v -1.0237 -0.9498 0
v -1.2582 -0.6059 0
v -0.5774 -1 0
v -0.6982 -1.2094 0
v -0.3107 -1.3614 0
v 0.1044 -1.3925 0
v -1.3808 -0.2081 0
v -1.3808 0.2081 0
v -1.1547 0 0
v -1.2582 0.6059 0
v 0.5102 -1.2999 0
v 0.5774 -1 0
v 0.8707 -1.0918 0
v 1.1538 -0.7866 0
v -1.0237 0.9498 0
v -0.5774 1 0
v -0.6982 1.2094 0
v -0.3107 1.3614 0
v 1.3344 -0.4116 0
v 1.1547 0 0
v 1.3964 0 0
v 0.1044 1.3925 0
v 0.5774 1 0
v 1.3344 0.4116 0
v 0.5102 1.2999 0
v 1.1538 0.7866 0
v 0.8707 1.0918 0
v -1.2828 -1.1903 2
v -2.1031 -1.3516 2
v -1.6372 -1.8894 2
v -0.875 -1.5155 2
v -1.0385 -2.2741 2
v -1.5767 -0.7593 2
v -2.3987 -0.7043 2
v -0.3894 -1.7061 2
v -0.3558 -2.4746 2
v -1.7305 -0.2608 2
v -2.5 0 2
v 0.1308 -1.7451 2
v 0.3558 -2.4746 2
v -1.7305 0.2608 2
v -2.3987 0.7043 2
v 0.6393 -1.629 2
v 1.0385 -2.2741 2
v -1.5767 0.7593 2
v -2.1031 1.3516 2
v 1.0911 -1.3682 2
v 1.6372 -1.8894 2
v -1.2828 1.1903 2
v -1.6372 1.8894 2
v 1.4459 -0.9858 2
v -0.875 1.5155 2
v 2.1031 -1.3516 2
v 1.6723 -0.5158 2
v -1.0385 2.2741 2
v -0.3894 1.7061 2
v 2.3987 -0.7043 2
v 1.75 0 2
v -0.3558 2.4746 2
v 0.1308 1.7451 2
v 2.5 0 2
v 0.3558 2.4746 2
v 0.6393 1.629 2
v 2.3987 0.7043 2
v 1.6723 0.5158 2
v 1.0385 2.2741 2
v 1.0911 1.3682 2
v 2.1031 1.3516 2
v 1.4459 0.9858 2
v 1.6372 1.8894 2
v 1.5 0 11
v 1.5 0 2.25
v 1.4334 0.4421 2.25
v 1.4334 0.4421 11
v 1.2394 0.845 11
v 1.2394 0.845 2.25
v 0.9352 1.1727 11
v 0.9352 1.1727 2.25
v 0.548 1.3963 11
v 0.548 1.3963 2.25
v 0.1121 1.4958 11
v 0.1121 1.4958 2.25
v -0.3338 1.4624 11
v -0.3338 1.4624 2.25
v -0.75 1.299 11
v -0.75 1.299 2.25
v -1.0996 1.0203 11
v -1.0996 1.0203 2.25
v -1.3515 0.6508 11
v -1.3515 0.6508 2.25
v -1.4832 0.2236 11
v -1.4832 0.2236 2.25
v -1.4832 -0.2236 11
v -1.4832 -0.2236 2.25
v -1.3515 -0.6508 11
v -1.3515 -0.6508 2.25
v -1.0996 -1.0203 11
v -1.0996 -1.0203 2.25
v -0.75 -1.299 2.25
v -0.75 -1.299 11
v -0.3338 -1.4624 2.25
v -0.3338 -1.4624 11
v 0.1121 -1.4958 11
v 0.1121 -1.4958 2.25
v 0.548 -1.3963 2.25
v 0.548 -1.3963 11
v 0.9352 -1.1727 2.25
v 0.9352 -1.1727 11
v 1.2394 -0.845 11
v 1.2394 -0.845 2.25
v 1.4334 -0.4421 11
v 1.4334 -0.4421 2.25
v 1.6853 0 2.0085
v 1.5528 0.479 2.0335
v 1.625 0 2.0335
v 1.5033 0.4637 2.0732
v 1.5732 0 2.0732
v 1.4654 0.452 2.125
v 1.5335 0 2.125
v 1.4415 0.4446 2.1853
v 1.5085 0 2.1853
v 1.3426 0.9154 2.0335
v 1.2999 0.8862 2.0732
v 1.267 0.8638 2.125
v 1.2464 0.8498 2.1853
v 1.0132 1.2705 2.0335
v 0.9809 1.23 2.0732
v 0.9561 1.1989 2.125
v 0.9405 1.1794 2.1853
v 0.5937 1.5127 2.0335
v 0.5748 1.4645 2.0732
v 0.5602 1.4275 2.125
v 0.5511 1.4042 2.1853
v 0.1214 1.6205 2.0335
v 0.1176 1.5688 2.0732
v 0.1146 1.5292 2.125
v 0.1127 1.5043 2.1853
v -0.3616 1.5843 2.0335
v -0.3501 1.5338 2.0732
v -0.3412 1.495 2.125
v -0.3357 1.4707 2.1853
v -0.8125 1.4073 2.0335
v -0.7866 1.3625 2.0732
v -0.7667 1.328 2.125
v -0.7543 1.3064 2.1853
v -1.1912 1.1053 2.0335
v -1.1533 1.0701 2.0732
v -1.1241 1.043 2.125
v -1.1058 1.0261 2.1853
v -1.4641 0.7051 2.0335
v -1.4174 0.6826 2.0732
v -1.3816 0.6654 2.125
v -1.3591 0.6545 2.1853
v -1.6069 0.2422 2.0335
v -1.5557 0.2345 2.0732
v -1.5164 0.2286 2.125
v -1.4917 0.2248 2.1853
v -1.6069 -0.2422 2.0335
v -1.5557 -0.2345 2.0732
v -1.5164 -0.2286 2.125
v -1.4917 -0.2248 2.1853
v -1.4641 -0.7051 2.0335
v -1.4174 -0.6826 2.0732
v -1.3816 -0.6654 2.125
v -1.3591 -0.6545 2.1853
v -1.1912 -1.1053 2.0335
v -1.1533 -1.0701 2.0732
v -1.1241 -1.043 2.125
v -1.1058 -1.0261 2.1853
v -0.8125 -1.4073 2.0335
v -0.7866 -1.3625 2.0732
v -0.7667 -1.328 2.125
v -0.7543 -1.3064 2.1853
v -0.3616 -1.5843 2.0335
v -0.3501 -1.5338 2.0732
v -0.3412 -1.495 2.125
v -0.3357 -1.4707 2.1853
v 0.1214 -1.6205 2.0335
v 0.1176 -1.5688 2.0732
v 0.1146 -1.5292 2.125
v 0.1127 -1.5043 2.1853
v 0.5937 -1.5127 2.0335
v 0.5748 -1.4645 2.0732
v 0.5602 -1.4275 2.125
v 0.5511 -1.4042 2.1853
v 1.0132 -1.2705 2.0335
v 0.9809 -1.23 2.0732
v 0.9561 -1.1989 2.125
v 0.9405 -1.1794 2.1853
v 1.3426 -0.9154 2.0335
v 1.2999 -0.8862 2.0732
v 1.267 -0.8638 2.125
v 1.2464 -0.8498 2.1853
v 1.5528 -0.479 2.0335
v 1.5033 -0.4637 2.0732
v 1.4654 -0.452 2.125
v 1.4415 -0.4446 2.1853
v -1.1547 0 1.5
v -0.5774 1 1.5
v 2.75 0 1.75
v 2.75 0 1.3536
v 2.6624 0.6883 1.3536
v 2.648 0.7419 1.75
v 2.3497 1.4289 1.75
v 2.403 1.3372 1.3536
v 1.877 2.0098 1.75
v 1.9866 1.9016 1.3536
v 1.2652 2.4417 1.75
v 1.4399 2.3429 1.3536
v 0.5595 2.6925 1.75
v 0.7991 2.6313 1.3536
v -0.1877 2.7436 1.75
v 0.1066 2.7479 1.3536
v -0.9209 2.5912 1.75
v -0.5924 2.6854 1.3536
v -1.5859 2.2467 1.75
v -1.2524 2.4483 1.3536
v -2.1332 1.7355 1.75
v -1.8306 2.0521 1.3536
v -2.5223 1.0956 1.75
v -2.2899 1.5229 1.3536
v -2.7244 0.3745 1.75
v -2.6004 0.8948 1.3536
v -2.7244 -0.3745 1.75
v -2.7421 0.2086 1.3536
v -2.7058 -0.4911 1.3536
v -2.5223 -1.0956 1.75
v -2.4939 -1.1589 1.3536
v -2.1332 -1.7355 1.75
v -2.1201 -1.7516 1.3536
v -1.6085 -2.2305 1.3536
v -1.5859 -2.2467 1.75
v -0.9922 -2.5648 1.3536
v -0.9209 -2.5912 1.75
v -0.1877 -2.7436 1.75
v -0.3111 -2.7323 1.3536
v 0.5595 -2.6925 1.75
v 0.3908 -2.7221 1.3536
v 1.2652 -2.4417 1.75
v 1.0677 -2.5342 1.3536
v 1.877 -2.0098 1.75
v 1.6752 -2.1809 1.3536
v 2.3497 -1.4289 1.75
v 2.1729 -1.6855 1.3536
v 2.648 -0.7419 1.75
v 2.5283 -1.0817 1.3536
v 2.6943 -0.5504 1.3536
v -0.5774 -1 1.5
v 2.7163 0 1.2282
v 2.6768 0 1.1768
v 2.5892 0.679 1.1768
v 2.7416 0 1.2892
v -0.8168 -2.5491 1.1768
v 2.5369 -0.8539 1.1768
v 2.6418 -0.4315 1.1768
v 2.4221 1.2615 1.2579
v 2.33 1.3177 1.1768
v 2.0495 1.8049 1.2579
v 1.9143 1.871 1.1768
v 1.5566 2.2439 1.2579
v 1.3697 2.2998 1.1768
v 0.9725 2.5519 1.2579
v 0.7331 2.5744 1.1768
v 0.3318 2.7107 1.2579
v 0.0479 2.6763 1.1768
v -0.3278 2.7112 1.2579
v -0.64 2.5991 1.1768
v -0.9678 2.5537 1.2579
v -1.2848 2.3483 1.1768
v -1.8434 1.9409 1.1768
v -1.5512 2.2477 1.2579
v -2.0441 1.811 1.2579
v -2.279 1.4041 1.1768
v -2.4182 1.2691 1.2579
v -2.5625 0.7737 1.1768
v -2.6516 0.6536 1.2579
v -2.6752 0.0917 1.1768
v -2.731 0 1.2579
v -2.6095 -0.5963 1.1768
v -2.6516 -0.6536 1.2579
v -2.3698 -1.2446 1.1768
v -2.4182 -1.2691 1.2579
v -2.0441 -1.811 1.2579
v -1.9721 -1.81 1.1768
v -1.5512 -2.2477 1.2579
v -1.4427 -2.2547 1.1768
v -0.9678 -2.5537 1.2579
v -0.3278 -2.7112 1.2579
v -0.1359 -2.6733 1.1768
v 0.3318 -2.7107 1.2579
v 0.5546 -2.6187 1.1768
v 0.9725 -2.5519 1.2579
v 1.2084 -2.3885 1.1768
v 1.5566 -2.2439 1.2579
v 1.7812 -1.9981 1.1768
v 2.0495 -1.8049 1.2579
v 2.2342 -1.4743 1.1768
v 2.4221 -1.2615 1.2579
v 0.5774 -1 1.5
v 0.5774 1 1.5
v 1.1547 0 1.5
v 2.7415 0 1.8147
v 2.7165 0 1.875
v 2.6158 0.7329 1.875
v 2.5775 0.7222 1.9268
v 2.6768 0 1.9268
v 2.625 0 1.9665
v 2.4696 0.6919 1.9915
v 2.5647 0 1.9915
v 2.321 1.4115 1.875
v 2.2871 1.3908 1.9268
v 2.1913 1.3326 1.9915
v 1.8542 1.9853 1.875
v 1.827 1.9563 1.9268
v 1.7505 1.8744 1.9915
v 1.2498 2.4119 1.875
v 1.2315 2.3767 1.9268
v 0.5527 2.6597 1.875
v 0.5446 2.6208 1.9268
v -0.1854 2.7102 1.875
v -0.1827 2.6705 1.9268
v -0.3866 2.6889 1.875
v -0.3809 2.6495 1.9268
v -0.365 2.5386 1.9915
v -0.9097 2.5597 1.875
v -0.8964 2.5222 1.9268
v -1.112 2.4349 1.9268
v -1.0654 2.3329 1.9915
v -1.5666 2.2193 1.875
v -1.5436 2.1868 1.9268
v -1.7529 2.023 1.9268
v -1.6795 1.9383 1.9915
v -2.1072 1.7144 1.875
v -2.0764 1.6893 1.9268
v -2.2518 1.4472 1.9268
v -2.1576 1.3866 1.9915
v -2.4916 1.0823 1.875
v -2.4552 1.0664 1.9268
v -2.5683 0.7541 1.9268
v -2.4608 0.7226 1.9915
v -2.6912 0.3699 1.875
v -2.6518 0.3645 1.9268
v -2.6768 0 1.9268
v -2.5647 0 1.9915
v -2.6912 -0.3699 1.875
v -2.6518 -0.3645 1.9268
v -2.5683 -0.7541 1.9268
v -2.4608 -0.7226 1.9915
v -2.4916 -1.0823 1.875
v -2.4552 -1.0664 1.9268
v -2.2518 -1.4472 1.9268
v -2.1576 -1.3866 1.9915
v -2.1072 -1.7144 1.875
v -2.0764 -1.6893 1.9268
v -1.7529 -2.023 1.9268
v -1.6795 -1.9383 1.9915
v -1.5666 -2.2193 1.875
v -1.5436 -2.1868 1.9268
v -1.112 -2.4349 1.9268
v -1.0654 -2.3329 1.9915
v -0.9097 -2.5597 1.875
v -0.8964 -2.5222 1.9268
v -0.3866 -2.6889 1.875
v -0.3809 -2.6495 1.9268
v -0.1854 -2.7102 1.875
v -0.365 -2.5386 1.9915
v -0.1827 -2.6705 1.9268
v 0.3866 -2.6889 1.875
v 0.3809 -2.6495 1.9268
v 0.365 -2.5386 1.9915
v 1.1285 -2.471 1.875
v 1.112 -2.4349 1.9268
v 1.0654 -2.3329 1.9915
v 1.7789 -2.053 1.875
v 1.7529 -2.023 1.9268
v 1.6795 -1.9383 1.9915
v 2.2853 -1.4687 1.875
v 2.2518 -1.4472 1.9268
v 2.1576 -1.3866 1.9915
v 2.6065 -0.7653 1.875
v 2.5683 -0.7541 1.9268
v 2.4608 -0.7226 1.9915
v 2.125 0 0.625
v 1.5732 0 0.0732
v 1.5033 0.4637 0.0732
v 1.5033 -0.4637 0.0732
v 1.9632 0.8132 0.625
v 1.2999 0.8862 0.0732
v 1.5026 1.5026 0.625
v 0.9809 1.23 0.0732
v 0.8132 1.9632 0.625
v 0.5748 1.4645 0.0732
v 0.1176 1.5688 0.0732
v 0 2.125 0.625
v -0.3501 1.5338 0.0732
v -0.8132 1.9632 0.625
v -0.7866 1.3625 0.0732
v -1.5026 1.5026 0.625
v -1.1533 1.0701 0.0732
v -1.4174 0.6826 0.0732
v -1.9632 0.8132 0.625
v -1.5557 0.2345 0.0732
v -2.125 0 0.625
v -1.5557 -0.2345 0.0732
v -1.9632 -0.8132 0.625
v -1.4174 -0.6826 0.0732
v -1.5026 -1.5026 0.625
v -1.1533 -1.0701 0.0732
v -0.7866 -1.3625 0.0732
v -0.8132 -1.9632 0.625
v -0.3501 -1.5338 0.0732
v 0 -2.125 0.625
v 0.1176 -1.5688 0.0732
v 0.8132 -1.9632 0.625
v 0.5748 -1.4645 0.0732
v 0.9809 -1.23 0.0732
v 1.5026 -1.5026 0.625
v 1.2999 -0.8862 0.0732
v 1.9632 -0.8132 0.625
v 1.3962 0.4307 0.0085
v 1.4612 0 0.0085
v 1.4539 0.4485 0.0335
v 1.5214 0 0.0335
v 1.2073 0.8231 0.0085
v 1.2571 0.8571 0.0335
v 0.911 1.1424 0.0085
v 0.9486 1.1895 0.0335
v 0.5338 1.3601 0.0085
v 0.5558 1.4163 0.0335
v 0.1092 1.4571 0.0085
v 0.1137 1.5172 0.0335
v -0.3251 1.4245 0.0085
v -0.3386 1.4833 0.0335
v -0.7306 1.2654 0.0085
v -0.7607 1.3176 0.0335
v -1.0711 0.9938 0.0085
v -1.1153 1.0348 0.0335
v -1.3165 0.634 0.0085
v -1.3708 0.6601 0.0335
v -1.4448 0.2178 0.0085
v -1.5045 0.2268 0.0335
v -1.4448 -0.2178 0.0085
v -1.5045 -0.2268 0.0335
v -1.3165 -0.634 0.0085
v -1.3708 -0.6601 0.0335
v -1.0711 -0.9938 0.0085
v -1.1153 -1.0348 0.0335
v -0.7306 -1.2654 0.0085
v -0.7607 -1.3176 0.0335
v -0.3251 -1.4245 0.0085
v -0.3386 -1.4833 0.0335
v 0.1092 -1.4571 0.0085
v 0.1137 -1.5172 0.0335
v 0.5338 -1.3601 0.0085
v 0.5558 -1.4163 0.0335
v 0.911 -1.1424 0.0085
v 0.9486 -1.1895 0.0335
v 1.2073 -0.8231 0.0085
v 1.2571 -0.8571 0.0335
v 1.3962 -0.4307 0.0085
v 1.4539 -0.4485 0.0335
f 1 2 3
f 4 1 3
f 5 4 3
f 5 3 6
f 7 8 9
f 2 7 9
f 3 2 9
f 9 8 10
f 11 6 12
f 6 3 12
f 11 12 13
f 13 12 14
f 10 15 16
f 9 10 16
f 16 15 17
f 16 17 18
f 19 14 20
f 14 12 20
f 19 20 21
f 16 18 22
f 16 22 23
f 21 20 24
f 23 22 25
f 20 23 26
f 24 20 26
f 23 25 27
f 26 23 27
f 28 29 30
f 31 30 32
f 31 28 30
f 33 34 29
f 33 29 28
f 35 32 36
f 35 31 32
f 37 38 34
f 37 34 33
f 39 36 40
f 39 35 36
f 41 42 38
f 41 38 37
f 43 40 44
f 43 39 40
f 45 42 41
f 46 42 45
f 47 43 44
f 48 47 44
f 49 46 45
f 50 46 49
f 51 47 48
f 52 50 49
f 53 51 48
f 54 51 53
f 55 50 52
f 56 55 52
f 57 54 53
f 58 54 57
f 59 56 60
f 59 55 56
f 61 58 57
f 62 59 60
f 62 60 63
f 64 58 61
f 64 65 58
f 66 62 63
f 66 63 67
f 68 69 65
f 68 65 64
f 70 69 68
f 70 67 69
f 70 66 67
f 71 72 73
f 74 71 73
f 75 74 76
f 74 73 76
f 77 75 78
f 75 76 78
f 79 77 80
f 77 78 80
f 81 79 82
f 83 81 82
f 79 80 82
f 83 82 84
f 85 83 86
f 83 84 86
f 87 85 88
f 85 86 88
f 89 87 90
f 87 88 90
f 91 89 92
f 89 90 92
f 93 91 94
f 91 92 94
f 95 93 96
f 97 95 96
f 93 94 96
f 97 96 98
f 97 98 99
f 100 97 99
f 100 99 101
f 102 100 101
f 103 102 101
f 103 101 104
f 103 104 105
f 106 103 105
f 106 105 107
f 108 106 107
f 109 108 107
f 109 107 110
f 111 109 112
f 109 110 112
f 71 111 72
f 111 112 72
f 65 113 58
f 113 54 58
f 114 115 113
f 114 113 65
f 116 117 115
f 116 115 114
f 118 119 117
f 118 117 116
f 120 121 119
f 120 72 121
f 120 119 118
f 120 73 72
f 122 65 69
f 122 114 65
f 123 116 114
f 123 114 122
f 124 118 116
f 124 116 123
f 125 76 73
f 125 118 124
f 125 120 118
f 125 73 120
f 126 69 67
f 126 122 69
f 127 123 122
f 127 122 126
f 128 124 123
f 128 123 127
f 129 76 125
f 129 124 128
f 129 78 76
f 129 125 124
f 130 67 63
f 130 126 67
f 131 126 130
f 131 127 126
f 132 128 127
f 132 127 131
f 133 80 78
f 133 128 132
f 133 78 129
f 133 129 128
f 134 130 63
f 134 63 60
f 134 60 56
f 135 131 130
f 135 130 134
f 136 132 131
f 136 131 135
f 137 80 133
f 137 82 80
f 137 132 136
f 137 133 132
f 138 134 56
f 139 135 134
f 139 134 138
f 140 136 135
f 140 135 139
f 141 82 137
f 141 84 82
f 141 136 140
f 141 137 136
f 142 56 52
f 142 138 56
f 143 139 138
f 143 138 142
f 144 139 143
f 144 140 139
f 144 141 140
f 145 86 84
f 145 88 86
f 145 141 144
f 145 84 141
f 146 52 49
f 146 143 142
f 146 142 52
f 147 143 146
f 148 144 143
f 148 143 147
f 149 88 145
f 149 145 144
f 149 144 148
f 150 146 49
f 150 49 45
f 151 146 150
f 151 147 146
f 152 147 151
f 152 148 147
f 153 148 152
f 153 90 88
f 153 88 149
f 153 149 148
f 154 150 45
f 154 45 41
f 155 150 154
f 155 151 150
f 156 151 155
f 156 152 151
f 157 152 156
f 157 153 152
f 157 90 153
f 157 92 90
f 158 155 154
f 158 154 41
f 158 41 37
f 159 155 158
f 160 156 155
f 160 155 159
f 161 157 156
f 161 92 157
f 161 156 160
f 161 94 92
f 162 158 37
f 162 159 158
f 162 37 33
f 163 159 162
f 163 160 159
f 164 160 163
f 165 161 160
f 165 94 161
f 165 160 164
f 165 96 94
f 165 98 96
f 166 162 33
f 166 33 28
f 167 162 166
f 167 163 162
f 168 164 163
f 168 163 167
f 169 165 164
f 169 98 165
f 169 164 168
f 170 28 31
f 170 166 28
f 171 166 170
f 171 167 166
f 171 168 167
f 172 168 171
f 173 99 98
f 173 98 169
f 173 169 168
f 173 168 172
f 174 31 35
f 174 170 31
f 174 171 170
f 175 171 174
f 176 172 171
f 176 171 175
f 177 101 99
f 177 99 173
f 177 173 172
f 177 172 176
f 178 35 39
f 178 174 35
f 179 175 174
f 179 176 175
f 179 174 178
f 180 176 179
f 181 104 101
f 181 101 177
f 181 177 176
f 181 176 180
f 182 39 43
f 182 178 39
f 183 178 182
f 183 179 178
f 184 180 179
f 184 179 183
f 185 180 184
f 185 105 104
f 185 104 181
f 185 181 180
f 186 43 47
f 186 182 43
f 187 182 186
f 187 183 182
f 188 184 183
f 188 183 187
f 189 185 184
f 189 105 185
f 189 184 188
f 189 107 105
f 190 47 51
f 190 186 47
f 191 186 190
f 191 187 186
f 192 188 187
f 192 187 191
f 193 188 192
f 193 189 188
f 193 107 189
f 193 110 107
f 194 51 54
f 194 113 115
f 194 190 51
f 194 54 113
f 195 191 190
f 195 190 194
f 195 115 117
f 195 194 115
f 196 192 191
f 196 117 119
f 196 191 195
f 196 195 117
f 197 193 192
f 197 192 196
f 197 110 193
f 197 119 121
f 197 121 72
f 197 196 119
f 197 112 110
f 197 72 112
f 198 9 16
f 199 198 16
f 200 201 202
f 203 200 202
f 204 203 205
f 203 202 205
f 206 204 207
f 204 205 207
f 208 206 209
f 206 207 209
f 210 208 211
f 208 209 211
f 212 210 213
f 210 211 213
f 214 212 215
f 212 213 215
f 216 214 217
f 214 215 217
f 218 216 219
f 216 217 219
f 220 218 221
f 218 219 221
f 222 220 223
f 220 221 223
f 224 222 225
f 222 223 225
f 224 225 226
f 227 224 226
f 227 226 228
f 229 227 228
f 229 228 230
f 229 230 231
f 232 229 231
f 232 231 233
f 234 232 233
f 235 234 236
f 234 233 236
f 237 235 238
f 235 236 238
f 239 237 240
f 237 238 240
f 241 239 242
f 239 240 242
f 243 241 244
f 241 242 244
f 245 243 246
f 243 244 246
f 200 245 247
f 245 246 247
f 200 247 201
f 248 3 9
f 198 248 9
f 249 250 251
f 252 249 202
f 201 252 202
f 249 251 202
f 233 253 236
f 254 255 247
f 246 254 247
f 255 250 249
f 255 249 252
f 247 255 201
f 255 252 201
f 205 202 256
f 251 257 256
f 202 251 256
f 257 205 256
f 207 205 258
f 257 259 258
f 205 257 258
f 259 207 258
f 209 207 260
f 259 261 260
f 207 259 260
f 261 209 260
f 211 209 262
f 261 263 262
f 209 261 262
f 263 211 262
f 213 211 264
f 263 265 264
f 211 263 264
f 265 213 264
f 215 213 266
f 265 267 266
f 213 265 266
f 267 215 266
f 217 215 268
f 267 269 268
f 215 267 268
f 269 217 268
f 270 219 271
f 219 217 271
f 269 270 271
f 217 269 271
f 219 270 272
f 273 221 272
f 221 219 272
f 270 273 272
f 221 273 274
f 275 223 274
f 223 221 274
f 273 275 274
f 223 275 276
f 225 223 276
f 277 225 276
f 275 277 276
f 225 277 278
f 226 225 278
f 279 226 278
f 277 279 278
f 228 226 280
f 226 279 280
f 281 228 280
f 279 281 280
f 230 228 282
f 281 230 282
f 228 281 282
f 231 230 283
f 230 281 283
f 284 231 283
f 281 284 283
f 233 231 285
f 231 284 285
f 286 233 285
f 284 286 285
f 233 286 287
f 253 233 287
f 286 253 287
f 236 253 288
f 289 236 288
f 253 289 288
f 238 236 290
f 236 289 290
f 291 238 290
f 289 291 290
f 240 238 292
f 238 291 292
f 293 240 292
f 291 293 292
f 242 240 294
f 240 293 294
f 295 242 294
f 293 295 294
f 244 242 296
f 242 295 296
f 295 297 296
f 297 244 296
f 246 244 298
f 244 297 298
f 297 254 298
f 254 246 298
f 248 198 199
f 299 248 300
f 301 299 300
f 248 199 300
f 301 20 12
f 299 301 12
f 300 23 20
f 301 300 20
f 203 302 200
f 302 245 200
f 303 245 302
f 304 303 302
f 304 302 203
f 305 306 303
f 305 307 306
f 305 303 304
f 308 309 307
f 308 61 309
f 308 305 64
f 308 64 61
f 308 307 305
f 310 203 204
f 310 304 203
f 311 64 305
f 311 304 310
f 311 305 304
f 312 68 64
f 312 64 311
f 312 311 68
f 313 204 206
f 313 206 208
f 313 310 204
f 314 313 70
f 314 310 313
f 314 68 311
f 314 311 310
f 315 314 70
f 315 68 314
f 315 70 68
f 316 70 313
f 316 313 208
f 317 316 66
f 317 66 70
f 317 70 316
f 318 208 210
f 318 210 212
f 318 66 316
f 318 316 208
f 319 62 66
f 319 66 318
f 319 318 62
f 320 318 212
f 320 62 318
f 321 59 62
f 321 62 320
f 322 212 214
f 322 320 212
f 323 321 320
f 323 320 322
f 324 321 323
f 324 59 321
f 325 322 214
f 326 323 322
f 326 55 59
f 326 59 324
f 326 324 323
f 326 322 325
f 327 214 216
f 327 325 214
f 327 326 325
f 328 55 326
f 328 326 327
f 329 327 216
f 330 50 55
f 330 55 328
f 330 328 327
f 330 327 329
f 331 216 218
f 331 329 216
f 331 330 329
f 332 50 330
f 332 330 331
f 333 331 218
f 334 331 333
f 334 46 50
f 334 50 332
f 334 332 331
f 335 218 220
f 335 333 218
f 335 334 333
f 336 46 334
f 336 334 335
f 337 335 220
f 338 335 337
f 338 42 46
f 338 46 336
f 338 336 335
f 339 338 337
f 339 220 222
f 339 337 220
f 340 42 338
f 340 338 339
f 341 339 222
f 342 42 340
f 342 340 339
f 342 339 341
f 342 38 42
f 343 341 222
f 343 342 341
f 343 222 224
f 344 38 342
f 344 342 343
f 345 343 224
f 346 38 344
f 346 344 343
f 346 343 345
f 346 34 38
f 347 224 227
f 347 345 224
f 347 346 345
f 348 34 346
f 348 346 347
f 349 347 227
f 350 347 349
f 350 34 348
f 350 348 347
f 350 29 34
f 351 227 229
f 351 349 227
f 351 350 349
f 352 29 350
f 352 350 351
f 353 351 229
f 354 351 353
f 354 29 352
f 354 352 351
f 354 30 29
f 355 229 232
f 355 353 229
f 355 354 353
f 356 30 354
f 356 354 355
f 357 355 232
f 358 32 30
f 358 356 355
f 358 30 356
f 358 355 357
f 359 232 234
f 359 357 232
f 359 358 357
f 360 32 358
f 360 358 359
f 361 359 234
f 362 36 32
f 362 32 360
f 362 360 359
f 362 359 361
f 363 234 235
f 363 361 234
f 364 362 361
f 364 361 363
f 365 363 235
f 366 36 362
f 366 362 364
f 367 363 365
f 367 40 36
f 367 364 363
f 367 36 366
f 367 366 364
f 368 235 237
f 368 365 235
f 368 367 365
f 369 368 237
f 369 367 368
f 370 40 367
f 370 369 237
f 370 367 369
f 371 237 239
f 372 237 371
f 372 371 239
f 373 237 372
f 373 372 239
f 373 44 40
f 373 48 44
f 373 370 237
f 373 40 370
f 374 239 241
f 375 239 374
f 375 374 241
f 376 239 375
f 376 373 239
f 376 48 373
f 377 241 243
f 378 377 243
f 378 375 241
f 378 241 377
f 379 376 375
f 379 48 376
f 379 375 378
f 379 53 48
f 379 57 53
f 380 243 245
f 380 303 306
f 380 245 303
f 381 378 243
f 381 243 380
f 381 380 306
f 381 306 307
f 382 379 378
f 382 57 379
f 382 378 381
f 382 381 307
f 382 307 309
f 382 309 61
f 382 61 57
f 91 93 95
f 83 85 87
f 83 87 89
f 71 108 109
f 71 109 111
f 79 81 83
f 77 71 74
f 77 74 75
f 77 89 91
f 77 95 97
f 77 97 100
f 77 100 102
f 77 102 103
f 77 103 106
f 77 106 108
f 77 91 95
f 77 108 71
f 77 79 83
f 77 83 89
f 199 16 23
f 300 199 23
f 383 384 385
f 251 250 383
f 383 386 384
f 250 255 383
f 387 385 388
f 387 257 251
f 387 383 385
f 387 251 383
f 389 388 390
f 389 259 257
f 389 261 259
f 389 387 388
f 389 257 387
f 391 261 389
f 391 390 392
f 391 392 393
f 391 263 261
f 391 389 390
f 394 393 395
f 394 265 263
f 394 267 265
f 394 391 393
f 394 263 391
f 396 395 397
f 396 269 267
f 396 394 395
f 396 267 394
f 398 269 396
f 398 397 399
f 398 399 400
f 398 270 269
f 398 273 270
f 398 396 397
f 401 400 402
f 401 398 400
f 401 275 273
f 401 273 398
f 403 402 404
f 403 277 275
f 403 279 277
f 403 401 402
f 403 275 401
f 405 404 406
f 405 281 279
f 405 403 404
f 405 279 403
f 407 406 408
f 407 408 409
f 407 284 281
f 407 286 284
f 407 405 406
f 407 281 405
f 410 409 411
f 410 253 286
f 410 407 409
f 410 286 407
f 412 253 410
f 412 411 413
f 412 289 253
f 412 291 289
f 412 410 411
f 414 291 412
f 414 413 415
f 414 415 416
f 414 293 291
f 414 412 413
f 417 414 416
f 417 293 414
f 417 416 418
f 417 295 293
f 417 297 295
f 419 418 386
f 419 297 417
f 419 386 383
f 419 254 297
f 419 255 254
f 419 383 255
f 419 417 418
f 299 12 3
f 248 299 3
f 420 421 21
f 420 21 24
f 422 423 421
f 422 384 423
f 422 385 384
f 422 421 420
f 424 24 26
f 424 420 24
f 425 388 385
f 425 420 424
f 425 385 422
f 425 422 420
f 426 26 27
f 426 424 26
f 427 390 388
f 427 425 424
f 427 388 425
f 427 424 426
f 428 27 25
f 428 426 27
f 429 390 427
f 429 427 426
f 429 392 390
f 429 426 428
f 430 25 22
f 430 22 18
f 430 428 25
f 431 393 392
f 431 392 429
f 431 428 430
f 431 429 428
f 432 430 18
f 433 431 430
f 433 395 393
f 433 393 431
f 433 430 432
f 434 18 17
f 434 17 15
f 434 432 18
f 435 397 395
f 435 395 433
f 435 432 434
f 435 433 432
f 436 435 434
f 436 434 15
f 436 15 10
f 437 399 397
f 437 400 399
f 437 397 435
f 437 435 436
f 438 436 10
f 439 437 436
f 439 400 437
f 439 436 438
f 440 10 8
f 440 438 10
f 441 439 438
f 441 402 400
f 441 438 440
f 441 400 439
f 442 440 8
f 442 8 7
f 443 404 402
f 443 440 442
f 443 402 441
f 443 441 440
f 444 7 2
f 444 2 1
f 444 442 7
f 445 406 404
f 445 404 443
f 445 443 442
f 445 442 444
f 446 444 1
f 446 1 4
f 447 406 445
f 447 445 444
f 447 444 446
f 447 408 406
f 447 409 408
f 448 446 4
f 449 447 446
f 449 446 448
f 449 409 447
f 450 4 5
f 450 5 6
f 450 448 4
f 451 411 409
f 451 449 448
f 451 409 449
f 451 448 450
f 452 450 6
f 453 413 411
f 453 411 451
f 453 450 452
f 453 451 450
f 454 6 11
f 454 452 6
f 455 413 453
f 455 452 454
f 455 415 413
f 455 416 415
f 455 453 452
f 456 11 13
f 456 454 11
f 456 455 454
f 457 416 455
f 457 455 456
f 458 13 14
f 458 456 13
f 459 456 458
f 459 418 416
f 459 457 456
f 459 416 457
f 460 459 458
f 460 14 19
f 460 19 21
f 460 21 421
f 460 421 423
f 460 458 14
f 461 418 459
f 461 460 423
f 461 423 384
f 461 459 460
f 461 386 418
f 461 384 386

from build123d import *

# Parameters (mm, degrees)
F1_R     = 2.75
F1_R_2   = 1.5
F2_DEPTH = 2
F3_START = 1.5
F3_DEPTH = 0.5
F4_START = 2
F4_DEPTH = 9
F5_SIZE2 = 1.25
F5_SIZE  = 1.25
F6_R     = 0.25


# Not quite as in the source:
# - a feature names something its author has since deleted; it is built from what else it names


with BuildPart() as f2:
    # F1 (on Top) → F2 (new body)
    with BuildSketch(Plane.XY):
        Circle(F1_R)
        Circle(F1_R_2, mode=Mode.SUBTRACT)
        Circle(F1_R_2)
        Polygon((-0.5773502692, -1), (-1.1547005384, 0), (-0.5773502692, 1), (0.5773502692, 1), (1.1547005384, 0), (0.5773502692, -1), align=None, mode=Mode.SUBTRACT)
    extrude(amount=F2_DEPTH)

    # F1 (on Top) → F3 (join)
    with BuildSketch(Plane.XY.offset(F3_START)):
        Polygon((-0.5773502692, 1), (-1.1547005384, 0), (-0.5773502692, -1), (0.5773502692, -1), (1.1547005384, 0), (0.5773502692, 1), align=None)
    extrude(amount=F3_DEPTH)

    # F1 (on Top) → F4 (join)
    with BuildSketch(Plane.XY.offset(F4_START)):
        Circle(F1_R_2)
        Polygon((-0.5773502692, -1), (-1.1547005384, 0), (-0.5773502692, 1), (0.5773502692, 1), (1.1547005384, 0), (0.5773502692, -1), align=None, mode=Mode.SUBTRACT)
        Polygon((-0.5773502692, 1), (-1.1547005384, 0), (-0.5773502692, -1), (0.5773502692, -1), (1.1547005384, 0), (0.5773502692, 1), align=None)
    extrude(amount=F4_DEPTH)

    # F5
    f5_edges = [f2.edges().sort_by_distance(p)[0] for p in [
        (-2.75, 0, 0),
    ]]
    chamfer(f5_edges, length=F5_SIZE, length2=F5_SIZE2)

    # F6
    f6_edges = [f2.edges().sort_by_distance(p)[0] for p in [
        (-2.75, 0, 2),
        (-1.5, 0, 2),
        (-1.5, 0, 0),
        (-2.75, 0, 1.25),
    ]]
    fillet(f6_edges, radius=F6_R)


solid = f2.part
